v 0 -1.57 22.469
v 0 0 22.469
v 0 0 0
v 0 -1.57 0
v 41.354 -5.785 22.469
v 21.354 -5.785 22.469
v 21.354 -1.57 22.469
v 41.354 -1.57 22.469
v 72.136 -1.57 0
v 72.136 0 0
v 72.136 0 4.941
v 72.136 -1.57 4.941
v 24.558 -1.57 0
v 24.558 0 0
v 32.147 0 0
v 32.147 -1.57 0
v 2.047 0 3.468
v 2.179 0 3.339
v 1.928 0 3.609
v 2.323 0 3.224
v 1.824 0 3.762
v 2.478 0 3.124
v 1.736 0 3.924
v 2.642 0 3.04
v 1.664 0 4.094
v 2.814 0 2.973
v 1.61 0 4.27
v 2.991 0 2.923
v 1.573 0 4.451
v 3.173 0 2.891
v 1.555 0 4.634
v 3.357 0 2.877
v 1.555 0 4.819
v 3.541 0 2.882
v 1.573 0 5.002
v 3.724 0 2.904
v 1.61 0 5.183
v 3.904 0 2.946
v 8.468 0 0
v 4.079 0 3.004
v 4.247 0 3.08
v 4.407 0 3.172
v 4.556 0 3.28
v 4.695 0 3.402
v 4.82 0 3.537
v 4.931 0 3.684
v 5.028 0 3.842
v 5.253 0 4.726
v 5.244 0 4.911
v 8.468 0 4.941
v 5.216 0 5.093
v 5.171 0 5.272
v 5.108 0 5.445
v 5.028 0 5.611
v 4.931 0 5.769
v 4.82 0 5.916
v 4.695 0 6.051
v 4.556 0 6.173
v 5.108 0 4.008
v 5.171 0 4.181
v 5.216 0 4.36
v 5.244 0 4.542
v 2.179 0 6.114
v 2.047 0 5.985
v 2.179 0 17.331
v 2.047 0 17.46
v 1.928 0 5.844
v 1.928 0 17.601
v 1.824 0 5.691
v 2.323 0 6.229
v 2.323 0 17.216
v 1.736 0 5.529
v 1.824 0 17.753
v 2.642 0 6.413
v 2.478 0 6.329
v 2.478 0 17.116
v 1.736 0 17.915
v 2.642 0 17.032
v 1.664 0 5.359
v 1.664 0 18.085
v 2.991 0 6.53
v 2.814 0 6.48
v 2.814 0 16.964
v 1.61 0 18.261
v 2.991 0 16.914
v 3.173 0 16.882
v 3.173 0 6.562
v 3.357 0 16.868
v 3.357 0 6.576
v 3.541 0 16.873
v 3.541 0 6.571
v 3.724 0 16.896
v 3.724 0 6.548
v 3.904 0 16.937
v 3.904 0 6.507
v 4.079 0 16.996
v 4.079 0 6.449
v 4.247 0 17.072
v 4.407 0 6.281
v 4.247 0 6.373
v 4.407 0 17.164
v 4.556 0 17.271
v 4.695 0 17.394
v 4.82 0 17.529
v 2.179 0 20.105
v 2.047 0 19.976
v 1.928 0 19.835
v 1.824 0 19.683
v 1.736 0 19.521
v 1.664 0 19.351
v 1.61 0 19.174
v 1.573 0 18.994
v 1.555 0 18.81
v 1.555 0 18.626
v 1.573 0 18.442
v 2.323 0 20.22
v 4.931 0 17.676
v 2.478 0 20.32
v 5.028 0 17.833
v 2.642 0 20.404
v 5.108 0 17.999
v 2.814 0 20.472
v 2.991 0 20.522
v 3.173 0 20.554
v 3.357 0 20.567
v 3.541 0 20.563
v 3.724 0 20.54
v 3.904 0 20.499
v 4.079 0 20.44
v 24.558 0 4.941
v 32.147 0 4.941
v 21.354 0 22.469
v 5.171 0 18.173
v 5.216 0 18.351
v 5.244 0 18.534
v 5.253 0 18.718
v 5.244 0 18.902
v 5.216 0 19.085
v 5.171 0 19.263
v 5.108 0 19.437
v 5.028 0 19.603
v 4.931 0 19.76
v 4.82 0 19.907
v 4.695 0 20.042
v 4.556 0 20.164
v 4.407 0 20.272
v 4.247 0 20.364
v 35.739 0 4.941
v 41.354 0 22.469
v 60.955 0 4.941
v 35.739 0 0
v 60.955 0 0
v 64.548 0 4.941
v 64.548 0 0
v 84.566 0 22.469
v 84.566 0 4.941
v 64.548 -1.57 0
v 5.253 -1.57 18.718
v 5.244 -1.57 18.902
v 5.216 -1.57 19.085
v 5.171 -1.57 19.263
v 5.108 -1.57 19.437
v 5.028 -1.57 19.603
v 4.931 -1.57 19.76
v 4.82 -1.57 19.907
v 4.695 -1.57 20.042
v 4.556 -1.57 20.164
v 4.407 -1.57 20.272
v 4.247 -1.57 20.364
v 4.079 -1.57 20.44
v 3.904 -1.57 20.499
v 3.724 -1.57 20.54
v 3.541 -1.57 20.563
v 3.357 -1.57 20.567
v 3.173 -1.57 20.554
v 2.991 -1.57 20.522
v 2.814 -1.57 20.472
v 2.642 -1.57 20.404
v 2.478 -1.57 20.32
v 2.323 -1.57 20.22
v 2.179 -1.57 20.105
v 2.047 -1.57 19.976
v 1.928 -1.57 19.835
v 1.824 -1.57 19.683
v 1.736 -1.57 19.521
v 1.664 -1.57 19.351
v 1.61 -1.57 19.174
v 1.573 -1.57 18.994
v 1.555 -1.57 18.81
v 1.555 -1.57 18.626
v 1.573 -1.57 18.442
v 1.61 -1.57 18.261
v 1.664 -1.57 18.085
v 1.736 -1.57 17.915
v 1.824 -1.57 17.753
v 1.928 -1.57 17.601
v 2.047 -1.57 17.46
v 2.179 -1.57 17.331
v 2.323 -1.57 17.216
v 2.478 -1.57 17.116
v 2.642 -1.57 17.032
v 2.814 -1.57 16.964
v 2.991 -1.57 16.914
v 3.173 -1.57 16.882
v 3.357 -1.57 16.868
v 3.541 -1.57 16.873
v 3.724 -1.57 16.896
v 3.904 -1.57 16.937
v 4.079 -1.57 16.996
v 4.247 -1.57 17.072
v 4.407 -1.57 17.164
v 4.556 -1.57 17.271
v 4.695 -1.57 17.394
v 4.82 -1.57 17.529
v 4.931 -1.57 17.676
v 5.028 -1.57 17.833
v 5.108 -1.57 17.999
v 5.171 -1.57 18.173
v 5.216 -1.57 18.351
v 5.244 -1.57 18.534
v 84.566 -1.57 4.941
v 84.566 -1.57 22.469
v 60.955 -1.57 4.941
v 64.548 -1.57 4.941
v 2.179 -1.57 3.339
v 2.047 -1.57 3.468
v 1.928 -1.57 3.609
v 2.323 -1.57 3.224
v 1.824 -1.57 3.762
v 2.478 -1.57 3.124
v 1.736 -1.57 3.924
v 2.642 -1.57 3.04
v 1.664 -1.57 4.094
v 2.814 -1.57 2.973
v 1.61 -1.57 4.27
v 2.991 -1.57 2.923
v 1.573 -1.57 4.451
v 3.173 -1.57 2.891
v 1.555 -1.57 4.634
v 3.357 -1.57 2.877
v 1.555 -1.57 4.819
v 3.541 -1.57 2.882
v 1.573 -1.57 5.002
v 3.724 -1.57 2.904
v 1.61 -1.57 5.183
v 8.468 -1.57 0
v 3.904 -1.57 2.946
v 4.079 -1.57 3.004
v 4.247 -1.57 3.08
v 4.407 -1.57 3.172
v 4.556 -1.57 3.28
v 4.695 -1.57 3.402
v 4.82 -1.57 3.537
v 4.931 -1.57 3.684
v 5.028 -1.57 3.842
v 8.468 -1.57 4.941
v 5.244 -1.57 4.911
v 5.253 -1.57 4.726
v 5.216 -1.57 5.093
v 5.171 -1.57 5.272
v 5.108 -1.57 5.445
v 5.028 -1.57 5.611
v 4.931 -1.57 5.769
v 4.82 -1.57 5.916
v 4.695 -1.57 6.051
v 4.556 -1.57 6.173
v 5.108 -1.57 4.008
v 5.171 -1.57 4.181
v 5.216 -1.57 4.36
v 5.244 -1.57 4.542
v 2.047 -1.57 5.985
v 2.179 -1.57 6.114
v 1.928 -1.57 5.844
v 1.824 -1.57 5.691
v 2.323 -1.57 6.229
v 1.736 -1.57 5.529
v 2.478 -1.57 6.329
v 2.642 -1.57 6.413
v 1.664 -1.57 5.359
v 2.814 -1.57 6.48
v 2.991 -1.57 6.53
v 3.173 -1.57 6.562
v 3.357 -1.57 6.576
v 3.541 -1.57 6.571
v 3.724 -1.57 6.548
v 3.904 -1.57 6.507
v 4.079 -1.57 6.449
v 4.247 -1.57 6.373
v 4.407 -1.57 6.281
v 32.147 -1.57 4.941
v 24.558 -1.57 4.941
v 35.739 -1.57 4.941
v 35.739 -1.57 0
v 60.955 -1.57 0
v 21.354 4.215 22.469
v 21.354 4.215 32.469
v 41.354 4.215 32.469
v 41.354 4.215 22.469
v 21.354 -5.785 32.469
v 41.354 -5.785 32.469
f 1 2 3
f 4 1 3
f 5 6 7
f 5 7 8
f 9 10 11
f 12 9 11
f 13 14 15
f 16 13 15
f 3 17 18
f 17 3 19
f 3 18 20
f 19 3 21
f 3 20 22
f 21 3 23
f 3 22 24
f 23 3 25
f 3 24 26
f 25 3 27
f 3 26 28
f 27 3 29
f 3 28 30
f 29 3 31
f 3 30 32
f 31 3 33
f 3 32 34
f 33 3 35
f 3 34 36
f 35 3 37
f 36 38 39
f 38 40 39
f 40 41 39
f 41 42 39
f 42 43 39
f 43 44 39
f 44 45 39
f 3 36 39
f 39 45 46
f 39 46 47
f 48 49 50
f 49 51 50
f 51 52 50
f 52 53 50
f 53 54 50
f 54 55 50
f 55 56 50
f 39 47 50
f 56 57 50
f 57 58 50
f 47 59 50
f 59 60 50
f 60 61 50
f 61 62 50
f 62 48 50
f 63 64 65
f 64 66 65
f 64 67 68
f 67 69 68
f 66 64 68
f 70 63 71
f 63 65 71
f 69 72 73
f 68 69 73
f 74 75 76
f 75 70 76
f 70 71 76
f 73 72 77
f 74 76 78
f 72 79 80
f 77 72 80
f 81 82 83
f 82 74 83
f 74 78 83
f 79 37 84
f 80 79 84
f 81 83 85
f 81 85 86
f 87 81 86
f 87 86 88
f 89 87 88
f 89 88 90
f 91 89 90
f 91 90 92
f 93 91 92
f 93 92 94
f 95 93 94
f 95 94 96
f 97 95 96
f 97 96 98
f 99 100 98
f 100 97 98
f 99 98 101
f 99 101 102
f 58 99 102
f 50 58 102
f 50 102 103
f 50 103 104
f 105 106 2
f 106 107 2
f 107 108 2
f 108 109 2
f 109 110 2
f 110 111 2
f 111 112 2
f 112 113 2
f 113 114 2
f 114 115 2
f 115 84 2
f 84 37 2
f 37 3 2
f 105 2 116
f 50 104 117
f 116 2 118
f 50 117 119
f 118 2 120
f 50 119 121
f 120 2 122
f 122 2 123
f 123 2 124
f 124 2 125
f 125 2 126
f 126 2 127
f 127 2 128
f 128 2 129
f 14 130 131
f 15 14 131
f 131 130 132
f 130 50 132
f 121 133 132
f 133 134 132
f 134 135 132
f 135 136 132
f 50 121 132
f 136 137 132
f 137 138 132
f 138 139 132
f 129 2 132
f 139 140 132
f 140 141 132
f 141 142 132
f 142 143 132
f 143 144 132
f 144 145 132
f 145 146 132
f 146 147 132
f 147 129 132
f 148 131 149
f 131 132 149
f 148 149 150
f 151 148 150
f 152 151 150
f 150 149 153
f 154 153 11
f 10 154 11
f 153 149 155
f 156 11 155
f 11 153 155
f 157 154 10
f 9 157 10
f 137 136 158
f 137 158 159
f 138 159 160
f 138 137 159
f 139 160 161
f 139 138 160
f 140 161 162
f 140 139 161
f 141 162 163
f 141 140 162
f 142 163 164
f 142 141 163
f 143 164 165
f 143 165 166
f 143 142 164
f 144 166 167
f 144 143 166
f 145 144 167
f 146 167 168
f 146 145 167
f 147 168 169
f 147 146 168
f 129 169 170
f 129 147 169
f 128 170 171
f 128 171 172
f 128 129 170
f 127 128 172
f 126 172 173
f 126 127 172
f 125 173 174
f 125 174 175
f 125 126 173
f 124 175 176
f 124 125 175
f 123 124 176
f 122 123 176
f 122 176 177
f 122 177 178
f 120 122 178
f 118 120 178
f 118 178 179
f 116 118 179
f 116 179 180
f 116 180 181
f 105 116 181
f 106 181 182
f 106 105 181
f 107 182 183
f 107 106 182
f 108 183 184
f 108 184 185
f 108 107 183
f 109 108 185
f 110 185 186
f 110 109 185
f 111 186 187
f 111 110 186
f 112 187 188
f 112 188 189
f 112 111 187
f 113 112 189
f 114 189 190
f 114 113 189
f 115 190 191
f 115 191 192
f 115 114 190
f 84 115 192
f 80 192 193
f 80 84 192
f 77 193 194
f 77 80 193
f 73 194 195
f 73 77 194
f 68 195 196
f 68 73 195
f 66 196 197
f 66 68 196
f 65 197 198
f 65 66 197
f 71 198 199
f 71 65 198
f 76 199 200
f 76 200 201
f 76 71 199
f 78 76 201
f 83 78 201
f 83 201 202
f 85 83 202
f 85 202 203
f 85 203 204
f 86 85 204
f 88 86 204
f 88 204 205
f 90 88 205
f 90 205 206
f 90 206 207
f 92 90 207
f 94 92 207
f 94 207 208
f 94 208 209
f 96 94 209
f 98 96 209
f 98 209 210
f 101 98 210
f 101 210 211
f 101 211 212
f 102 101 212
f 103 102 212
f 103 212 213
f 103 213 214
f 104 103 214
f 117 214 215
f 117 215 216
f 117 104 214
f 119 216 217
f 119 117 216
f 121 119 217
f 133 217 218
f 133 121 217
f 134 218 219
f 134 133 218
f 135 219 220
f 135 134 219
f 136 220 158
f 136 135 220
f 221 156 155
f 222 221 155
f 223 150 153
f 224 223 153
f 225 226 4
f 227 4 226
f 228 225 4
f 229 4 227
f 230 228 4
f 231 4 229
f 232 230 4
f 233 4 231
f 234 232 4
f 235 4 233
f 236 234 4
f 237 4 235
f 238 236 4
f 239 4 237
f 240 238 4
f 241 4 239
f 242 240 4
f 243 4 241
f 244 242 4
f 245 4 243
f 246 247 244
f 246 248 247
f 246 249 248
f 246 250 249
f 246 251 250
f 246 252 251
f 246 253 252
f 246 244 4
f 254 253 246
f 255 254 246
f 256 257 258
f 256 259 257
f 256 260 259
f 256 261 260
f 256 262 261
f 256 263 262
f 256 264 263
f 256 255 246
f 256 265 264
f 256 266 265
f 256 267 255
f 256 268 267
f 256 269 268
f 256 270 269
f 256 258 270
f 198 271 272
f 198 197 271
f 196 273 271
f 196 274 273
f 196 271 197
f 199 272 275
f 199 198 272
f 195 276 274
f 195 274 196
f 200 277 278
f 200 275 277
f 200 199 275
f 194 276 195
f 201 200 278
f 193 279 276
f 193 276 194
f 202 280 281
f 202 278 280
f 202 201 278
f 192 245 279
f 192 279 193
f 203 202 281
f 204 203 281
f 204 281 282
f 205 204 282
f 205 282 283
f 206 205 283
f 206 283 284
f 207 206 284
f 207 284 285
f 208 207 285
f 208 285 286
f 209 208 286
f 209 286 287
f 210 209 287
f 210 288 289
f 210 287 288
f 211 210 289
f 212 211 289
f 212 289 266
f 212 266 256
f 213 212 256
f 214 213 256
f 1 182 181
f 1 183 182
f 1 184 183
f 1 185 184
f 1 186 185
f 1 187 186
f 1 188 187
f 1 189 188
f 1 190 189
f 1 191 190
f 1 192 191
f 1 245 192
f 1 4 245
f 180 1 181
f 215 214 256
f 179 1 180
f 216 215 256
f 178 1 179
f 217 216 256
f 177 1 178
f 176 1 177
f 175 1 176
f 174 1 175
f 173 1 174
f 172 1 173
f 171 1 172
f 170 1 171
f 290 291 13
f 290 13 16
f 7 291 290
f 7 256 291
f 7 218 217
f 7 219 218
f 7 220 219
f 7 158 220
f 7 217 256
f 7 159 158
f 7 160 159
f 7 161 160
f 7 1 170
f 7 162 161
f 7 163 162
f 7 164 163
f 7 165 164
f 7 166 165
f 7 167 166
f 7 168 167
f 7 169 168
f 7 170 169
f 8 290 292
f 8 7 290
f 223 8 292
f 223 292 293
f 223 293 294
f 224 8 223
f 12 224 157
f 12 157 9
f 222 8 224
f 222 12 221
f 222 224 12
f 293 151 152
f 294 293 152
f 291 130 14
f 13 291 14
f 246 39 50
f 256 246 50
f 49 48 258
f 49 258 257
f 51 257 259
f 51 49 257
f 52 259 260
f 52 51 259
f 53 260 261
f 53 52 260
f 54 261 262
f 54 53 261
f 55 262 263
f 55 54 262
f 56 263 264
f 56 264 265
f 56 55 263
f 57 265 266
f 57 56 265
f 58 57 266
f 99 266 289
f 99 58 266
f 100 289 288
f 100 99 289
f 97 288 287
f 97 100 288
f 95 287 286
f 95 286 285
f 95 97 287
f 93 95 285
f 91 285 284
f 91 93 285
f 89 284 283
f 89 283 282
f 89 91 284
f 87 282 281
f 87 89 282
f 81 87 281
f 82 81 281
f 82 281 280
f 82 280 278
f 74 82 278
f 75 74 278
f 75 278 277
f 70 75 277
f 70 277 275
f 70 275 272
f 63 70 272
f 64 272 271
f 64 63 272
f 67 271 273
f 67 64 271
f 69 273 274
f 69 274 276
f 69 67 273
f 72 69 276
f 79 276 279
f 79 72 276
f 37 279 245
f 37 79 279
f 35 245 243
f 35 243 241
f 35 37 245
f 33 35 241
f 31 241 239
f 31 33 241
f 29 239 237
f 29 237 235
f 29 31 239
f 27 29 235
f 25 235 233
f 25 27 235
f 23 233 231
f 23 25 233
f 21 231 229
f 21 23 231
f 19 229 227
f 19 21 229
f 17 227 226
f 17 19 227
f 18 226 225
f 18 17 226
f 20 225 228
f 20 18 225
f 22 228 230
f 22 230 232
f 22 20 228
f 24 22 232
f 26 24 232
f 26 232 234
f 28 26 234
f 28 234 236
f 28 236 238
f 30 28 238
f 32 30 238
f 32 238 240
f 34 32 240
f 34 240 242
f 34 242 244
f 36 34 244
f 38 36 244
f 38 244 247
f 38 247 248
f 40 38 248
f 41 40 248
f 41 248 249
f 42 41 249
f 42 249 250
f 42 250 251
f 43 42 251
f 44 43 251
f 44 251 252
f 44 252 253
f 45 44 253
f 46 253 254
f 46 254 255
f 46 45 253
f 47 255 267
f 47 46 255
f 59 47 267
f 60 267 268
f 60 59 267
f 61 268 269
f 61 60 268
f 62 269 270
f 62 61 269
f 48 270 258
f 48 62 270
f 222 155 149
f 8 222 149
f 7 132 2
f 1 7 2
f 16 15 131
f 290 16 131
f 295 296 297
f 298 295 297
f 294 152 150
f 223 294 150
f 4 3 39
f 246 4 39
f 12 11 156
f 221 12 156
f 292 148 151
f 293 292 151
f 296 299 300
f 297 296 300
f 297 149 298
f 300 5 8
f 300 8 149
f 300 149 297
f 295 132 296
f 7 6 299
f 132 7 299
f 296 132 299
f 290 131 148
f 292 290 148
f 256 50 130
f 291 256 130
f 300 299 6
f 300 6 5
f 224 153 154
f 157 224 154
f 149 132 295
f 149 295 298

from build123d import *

# Parameters (mm, degrees)
SKETCH_R     = 1.850117
PAD_DEPTH    = 1.57
SKETCH001_W  = 20
SKETCH001_H  = 10
PAD001_DEPTH = 10


with BuildPart() as part:
    # Sketch → Pad (new body)
    with BuildSketch(Plane.XZ):
        Polygon((0, 0), (8.46819, 0), (8.46819, 4.940975), (24.558208, 4.940975), (24.558208, 0), (32.146711, 0), (32.146711, 4.940975), (35.739379, 4.940975), (35.739379, 0), (60.955266, 0), (60.955266, 4.940975), (64.547934, 4.940975), (64.547934, 0), (72.136436, 0), (72.136436, 4.940975), (84.565834, 4.940975), (84.565834, 22.469307), (0, 22.469307), align=None)
        with Locations((3.4028, 4.726487)):
            Circle(SKETCH_R, mode=Mode.SUBTRACT)
        with Locations((3.4028, 18.717941)):
            Circle(SKETCH_R, mode=Mode.SUBTRACT)
    extrude(amount=PAD_DEPTH)

    # Sketch001 (on Face22 of Pad) → Pad001 (join)
    with BuildSketch(Plane.XZ.offset(5.785)):
        with Locations((31.353824, 27.469307)):
            Rectangle(SKETCH001_W, SKETCH001_H)
    extrude(amount=-PAD001_DEPTH)


solid = part.part
